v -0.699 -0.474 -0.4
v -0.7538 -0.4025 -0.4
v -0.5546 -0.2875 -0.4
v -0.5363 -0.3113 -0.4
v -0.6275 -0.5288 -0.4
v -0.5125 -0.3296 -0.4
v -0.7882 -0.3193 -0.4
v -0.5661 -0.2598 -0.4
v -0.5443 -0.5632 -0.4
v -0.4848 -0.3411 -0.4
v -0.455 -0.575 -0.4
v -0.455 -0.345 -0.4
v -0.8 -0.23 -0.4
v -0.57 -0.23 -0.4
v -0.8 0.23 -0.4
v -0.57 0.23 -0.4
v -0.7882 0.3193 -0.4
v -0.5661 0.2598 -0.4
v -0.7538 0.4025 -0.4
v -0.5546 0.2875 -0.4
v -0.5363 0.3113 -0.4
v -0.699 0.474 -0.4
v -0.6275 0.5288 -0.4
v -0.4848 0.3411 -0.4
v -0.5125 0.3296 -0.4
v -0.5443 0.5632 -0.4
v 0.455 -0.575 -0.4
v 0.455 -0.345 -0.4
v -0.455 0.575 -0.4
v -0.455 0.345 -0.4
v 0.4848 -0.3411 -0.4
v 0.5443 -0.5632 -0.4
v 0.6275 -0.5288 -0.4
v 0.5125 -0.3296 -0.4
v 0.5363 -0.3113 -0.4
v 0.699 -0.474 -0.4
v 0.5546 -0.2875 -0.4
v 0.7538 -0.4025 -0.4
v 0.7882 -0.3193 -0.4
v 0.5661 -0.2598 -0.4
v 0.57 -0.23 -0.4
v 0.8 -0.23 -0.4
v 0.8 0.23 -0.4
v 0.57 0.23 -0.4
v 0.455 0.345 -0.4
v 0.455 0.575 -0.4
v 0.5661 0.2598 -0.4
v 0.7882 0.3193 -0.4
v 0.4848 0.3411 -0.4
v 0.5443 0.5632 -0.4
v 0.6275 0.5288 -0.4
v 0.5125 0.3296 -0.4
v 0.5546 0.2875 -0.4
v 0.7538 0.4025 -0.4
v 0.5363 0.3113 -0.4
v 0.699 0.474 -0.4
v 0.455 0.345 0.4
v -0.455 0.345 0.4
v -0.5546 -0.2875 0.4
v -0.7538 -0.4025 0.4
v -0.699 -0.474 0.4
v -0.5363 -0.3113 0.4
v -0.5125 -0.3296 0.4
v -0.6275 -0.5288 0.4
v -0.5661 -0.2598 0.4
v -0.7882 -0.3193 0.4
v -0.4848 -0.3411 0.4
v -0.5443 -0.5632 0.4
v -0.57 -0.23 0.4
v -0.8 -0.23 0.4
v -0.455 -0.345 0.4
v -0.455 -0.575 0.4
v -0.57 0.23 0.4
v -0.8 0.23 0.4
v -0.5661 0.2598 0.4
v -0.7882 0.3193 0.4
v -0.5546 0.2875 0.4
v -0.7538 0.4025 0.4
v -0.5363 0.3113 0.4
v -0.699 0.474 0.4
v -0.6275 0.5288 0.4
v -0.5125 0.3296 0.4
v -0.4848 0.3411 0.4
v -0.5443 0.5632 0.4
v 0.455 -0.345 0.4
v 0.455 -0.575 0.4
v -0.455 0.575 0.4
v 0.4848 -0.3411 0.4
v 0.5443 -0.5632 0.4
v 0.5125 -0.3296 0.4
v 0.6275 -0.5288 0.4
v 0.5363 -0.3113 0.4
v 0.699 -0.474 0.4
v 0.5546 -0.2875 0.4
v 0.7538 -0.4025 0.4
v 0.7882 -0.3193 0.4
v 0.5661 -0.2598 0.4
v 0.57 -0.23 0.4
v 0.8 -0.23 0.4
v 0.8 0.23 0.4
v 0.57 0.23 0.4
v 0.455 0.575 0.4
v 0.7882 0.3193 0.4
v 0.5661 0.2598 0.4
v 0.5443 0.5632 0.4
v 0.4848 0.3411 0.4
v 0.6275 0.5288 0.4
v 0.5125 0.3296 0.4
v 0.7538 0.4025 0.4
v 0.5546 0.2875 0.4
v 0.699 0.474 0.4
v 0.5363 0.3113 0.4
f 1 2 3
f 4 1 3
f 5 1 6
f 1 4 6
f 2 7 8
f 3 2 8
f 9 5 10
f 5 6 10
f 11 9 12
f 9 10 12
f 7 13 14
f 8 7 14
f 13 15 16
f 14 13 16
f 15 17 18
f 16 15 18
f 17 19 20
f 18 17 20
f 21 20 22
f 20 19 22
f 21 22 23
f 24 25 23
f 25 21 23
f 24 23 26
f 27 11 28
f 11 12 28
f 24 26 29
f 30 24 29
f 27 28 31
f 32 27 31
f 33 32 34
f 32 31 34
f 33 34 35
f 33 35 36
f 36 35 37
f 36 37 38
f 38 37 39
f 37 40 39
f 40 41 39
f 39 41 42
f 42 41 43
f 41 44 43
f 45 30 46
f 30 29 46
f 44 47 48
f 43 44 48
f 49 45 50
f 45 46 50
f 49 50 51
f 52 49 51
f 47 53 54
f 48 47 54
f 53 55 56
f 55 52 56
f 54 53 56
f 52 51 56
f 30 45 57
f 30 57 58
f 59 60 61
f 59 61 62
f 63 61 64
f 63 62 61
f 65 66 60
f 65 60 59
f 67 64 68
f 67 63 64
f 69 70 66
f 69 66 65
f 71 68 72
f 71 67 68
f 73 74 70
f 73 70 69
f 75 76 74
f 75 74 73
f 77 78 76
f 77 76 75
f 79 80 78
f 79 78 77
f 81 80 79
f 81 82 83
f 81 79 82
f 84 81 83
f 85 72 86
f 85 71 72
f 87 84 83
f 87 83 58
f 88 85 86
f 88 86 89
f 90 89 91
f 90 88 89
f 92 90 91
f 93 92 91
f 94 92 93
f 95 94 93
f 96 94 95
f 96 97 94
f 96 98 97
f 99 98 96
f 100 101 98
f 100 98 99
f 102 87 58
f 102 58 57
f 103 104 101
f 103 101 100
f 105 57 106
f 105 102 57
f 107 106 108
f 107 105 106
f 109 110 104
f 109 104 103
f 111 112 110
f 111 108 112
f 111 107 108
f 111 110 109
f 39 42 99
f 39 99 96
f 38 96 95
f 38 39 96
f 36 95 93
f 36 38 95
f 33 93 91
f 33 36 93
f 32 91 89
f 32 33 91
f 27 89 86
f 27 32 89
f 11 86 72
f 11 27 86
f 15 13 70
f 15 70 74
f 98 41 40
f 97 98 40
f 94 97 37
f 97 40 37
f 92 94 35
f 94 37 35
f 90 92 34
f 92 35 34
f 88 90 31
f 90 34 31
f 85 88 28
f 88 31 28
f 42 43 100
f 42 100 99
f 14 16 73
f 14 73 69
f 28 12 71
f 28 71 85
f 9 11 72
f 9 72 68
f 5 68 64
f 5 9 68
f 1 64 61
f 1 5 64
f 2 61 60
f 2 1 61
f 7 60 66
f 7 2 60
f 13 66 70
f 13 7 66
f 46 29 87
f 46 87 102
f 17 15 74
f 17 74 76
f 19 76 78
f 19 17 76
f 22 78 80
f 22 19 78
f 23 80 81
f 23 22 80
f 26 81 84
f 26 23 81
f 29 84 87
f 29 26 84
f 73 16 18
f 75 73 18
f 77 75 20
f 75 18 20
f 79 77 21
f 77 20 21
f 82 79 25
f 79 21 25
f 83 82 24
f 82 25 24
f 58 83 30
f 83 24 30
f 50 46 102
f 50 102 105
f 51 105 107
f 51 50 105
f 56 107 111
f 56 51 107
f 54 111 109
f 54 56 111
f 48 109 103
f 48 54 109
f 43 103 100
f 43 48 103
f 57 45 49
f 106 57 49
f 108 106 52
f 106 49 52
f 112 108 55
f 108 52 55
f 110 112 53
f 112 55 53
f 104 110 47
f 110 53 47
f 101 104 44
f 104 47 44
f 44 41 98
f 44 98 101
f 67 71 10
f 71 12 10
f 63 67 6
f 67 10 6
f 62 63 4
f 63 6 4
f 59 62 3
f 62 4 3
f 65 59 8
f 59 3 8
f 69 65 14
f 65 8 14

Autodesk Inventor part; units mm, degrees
ref_plane "YZ Plane" through (0, 0, 0) normal (1, 0, 0) x (0, 1, 0)
ref_plane "XZ Plane" through (0, 0, 0) normal (0, 1, 0) x (-1, 0, 0)
ref_plane "XY Plane" through (0, 0, 0) normal (0, 0, 1) x (1, 0, 0)
sketch "Sketch1" plane through (0, 0, 0) normal (0, 0, 1) x (1, 0, 0)
  line L0 (-0.455, 0.575) -> (0.455, 0.575)
  line L1 (0.8, 0.23) -> (0.8, -0.23)
  line L2 (0.455, -0.575) -> (-0.455, -0.575)
  line L3 (-0.8, -0.23) -> (-0.8, 0.23)
  arc A0 (-0.455, 0.575) -> (-0.8, 0.23) centre (-0.455, 0.23) ccw
  arc A1 (0.8, 0.23) -> (0.455, 0.575) centre (0.455, 0.23) ccw
  arc A2 (0.455, -0.575) -> (0.8, -0.23) centre (0.455, -0.23) ccw
  arc A3 (-0.8, -0.23) -> (-0.455, -0.575) centre (-0.455, -0.23) ccw
  line L4 (-0.57, 0.23) -> (-0.57, -0.23)
  arc A4 (-0.57, -0.23) -> (-0.455, -0.345) centre (-0.455, -0.23) ccw
  line L5 (-0.455, -0.345) -> (0.455, -0.345)
  arc A5 (0.455, -0.345) -> (0.57, -0.23) centre (0.455, -0.23) ccw
  line L6 (0.57, -0.23) -> (0.57, 0.23)
  arc A6 (0.57, 0.23) -> (0.455, 0.345) centre (0.455, 0.23) ccw
  line L7 (0.455, 0.345) -> (-0.455, 0.345)
  arc A7 (-0.455, 0.345) -> (-0.57, 0.23) centre (-0.455, 0.23) ccw
  point P0 (0, 0)
  point P1 (-0.8, 0.575)
  point P2 (0.8, 0.575)
  point P3 (-0.8, -0.575)
  point P4 (0, 0.575)
  point P5 (-0.8, 0)
  dimension "d0" = 1.6
  dimension "d1" = 1.15
  dimension "d3" = 0.23
  dimension "d4" = 0.115
extrude "Extrusion1" add sketch "Sketch1" along normal mid plane 0.8
equation "\"d4\" = 0.5 * d3"
properties material "Zinc"
